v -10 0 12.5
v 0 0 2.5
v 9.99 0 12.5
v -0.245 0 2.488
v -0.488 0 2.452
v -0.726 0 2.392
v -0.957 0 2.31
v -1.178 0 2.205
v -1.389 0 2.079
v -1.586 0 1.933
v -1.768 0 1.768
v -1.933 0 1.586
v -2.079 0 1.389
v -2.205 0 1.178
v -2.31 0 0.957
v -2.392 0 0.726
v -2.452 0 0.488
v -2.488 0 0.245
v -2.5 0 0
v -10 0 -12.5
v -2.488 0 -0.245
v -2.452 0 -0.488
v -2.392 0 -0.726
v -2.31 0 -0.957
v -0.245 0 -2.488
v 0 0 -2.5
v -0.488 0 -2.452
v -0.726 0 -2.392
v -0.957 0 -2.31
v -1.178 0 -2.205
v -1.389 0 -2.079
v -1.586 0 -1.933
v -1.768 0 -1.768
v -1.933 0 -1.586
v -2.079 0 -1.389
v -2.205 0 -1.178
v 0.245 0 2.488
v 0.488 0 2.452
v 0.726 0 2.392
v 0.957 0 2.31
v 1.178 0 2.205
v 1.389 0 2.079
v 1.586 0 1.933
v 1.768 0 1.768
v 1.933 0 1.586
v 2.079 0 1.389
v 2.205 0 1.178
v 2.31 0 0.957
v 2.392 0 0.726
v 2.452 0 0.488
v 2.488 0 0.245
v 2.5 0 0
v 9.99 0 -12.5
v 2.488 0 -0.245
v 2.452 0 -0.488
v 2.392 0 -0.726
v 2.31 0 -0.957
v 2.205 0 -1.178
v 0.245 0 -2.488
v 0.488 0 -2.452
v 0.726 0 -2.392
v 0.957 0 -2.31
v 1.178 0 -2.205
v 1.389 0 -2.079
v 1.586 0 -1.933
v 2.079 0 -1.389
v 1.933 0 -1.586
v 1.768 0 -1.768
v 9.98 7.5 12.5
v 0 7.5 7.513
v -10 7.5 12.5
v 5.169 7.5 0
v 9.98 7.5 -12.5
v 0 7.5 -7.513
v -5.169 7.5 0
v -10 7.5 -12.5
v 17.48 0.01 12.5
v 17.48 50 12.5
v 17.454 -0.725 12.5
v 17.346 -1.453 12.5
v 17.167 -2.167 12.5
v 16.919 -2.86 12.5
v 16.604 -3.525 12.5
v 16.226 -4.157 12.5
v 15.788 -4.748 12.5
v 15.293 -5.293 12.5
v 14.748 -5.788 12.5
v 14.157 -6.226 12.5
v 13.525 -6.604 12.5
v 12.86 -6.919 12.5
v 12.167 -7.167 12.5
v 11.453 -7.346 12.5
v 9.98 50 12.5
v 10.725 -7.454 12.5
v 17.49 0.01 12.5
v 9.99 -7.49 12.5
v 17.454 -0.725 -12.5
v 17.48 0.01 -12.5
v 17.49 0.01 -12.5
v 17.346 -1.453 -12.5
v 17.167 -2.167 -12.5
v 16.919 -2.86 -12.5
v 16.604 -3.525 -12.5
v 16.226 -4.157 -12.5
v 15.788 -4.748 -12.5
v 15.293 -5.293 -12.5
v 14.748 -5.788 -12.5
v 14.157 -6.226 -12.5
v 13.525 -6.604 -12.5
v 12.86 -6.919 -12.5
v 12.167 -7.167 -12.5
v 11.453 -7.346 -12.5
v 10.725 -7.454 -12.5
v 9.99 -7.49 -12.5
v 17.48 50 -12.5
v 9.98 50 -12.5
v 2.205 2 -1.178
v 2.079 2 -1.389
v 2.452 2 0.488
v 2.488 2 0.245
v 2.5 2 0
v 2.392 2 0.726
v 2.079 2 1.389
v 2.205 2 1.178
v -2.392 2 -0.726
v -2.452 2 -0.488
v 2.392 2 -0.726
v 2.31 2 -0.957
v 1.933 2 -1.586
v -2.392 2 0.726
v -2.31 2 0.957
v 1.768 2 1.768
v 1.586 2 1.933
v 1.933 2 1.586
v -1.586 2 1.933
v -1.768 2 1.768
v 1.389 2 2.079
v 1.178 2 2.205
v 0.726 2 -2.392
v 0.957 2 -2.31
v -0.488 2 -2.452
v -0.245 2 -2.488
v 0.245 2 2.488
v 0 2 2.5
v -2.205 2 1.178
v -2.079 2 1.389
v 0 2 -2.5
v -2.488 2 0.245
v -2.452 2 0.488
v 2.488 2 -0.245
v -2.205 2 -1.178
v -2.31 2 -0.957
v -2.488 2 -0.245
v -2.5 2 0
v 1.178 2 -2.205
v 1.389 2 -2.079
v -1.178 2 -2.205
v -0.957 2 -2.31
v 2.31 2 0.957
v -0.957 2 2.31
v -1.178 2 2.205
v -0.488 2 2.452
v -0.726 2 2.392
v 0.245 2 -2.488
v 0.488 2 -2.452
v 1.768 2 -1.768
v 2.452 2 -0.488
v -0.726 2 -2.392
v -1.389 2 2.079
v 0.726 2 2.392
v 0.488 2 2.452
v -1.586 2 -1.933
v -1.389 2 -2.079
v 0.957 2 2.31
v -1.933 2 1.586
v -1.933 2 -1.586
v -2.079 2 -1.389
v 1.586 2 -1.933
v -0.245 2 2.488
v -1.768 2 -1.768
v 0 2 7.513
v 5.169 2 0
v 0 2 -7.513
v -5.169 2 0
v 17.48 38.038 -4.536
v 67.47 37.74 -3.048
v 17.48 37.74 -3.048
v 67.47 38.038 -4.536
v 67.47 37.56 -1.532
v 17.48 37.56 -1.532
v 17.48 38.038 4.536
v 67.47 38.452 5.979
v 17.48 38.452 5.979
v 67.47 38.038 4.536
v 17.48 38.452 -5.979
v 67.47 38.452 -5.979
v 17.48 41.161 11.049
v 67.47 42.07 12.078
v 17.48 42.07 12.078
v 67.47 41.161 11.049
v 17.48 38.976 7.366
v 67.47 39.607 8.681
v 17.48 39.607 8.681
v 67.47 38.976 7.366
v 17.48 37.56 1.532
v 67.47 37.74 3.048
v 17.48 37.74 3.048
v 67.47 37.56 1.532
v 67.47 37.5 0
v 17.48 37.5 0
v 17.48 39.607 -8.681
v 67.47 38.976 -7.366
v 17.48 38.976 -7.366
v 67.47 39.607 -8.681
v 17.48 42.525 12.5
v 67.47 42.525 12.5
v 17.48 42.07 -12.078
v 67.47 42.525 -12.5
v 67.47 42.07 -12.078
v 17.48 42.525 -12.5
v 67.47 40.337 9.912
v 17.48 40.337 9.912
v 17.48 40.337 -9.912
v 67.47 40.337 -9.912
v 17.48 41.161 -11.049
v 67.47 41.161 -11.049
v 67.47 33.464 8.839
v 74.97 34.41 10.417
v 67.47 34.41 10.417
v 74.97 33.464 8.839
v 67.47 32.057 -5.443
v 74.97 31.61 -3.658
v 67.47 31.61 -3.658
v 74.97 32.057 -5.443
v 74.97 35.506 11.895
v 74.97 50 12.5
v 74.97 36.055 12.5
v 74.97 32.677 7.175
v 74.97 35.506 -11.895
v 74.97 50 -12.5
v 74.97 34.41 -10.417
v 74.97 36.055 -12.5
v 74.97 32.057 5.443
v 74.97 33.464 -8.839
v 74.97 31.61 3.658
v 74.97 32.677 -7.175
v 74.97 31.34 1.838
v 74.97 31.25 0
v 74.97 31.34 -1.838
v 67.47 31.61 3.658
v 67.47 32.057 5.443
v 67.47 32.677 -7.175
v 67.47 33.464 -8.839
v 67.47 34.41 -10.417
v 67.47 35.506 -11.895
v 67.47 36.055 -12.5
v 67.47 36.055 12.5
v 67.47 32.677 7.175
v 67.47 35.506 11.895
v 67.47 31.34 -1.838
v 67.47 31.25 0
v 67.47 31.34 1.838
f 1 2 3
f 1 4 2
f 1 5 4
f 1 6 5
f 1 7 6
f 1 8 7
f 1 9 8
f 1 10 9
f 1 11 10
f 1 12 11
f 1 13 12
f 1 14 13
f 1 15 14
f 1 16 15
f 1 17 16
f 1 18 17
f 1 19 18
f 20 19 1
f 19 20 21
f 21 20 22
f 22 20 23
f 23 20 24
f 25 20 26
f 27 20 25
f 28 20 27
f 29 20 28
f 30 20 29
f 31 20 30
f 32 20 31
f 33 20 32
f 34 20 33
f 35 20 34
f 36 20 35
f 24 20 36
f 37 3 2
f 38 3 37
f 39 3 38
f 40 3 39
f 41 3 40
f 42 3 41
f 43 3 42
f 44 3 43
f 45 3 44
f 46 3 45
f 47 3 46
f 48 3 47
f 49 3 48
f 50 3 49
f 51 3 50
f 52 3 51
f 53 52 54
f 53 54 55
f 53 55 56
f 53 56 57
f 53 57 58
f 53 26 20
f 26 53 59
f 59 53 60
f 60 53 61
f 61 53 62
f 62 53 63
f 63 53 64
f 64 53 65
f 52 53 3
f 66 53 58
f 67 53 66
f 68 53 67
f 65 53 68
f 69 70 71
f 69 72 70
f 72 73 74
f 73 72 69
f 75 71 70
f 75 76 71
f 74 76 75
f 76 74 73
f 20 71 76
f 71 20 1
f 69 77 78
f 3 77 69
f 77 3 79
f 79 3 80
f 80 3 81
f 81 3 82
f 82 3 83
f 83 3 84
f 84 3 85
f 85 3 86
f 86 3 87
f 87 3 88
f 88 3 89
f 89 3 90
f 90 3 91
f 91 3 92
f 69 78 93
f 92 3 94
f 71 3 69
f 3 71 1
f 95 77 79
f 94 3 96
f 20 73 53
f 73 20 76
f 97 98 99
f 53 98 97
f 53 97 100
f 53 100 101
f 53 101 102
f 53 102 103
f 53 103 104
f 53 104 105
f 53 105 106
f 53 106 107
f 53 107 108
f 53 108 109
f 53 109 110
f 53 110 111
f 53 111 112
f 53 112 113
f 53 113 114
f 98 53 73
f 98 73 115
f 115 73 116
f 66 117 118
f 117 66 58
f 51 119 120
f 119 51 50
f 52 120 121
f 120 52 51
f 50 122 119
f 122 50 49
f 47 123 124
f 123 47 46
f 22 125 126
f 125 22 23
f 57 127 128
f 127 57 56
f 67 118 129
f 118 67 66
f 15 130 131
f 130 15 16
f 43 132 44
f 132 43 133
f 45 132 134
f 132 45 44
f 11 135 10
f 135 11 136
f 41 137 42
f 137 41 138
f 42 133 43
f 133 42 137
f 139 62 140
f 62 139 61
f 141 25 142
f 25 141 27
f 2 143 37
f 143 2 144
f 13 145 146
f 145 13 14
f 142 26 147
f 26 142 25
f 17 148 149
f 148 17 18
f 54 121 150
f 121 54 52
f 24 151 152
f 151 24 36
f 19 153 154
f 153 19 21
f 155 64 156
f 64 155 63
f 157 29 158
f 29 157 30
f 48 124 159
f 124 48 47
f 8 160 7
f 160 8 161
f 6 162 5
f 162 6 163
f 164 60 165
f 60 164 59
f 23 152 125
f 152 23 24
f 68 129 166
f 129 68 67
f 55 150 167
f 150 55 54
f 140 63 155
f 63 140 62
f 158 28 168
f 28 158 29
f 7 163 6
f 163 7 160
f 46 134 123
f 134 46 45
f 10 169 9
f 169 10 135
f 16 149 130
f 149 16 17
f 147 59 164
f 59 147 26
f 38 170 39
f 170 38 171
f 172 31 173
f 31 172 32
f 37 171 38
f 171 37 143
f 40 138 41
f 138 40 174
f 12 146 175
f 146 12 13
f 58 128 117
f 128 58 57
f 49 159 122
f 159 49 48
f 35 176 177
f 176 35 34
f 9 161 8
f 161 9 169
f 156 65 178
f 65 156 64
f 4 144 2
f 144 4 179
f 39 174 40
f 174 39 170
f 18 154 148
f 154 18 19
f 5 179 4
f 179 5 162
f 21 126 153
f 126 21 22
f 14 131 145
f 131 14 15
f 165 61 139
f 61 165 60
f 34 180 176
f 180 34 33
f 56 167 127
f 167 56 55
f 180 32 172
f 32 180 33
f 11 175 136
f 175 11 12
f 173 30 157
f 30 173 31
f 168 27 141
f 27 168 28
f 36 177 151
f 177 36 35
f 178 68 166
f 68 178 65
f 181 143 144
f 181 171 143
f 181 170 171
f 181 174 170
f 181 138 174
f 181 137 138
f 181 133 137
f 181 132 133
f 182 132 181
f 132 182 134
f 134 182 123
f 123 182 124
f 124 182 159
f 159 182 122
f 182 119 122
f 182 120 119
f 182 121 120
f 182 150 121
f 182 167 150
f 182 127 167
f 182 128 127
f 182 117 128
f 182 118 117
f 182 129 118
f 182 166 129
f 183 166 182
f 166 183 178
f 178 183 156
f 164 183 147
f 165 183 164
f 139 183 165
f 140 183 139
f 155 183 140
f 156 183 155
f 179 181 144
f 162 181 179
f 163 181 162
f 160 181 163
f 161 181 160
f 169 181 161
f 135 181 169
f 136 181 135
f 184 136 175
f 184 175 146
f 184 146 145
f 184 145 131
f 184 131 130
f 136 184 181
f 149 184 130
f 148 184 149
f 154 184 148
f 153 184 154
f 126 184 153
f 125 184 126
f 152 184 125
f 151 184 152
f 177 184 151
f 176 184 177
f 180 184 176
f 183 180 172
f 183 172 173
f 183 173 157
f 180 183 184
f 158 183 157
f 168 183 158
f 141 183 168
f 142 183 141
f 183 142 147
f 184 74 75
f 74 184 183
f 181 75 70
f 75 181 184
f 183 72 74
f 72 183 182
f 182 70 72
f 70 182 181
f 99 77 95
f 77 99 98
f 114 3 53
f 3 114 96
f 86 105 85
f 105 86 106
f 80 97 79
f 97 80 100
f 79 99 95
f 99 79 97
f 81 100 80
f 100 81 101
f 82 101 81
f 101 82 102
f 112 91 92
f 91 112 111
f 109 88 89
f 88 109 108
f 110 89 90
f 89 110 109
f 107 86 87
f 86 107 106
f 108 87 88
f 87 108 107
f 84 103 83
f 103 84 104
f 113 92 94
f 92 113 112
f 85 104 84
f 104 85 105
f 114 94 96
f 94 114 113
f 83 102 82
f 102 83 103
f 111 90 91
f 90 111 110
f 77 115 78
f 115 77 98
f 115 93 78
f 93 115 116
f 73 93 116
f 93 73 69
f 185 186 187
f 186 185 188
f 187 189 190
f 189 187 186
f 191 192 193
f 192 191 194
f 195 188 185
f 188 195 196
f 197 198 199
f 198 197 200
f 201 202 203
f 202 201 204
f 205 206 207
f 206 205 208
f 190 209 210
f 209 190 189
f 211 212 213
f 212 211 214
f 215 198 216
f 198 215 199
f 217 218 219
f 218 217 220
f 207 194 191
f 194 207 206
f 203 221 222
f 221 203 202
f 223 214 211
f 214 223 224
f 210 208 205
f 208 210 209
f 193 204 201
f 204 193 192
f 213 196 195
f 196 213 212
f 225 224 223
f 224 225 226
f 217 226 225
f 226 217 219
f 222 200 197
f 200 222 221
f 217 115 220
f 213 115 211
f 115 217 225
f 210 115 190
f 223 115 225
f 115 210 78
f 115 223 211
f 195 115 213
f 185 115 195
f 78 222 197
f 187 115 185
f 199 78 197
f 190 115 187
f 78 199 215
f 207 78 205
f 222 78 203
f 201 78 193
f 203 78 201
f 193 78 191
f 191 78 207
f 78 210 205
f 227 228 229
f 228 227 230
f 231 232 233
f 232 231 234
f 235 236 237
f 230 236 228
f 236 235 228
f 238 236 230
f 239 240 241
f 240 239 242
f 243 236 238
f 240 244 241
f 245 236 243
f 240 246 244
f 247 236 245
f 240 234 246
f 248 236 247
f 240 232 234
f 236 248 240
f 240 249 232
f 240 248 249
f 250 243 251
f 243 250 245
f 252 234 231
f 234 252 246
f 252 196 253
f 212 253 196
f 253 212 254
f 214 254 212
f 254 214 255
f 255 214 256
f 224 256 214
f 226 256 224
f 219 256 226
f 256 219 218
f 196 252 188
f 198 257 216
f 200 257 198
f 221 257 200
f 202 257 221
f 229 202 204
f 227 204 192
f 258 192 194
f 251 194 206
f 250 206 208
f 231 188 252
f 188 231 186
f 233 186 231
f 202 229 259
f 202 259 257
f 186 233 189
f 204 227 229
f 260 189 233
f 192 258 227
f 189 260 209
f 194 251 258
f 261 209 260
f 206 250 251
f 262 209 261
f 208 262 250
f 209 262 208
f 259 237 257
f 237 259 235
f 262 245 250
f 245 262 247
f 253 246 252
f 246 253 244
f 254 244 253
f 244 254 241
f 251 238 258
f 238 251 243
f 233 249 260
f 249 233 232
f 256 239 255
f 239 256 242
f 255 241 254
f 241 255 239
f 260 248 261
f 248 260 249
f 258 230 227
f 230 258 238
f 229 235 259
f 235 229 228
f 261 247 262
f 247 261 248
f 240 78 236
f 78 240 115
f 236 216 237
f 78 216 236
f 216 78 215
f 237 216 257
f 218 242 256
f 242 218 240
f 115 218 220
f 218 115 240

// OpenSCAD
table_thickness = 16.2;
table_edge_hole_offset = 10;
screw_hole_d = 5;
screw_cap_d = 8.5;


E = 0.01;


module hook() {
    $fn = 64;

    width = 25;
    length = 50;
    thickness = 7.5;

    module under_table() {
        // How thick is the place that is squished against the table by the screw
        bearing = 2;

        translate([0, 0, - thickness / 2])
        difference() {
            cube([table_edge_hole_offset * 2, width, thickness], center = true);

            cylinder(thickness + E, r = screw_hole_d / 2, center = true);

            translate([0, 0, - thickness / 2 - bearing])
            scale([0.86, 1.25, 1])
            rotate([0, 0, 45])
            translate([0, 0, thickness / 2])
                cube([screw_cap_d, screw_cap_d, thickness], center = true);
        }
    }

    module side() {
        translate([thickness / 2 - E, 0, - length / 2])
            cube([thickness, width, length], center = true);

        translate([0, 0, - E])
        intersection() {
            translate([thickness / 2, 0, thickness / 2])
                cube([thickness, width, thickness], center = true);

            rotate([90, 0, 0])
                cylinder(width, r = thickness, center = true);
        }
    }

    module bend() {
        extent = 50;

        translate([extent / 2, 0, 0])
        intersection() {
            union() {
                scale([1, 1.25, 1])
                rotate([0, 90, 0])
                    cylinder(extent, r = width / 2, center = true);

                translate([(extent + thickness) / 2 - E, 0, 0])
                rotate([0, 90, 0])
                    cylinder(thickness, r = width * 3 / 4, center = true);
            }

            translate([thickness / 2, 0, width / 2])
                cube([extent + thickness, width, width], center = true);
        }
    }

    under_table();

    translate([table_edge_hole_offset - E, 0, 0])
        side();

    translate([table_edge_hole_offset + thickness - E * 2, 0, - length])
        bend();
}


rotate([90, 0, 0])
    hook();
